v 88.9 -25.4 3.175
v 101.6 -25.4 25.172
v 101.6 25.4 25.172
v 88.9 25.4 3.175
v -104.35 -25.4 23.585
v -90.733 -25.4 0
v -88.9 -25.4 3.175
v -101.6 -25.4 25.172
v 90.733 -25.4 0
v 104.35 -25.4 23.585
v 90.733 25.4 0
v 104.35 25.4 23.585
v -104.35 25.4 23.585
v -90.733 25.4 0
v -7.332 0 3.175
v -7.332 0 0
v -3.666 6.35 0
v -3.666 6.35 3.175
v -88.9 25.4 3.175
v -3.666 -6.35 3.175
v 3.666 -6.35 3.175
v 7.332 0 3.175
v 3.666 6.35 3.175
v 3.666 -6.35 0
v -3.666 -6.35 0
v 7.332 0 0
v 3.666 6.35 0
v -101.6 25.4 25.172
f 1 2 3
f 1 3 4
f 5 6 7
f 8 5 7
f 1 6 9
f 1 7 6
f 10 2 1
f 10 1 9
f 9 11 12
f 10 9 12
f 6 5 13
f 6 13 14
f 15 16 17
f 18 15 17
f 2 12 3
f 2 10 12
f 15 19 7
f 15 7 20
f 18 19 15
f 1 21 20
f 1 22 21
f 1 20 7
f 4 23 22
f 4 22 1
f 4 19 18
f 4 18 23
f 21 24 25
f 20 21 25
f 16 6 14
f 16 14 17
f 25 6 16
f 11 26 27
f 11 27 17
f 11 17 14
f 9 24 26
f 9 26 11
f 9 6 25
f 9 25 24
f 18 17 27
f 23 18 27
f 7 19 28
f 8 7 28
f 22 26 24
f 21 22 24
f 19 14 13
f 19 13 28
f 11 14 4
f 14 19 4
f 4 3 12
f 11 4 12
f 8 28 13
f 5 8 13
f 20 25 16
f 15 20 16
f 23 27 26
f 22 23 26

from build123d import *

# Parameters (mm, degrees)
F0_W     = 177.8
F0_H     = 50.8
F1_DEPTH = 3.175
F3_DEPTH = 25.4


with BuildPart() as f1:
    # F0 (on Top) → F1 (new body)
    with BuildSketch(Plane.XY):
        Rectangle(F0_W, F0_H)
        Polygon((-3.666174, -6.35), (-7.332348, 0), (-3.666174, 6.35), (3.666174, 6.35), (7.332348, 0), (3.666174, -6.35), align=None, mode=Mode.SUBTRACT)
    extrude(amount=F1_DEPTH)

    # F2 (on Front) → F3 (join, symmetric)
    with BuildSketch(Plane.XZ):
        Polygon((-104.349631, 23.584545), (-90.733087, 0), (-88.9, 0), (-88.9, 3.175), (-101.6, 25.172045), align=None)
        Polygon((104.349631, 23.584545), (101.6, 25.172045), (88.9, 3.175), (88.9, 0), (90.733087, 0), align=None)
    extrude(amount=F3_DEPTH, both=True)


solid = f1.part
